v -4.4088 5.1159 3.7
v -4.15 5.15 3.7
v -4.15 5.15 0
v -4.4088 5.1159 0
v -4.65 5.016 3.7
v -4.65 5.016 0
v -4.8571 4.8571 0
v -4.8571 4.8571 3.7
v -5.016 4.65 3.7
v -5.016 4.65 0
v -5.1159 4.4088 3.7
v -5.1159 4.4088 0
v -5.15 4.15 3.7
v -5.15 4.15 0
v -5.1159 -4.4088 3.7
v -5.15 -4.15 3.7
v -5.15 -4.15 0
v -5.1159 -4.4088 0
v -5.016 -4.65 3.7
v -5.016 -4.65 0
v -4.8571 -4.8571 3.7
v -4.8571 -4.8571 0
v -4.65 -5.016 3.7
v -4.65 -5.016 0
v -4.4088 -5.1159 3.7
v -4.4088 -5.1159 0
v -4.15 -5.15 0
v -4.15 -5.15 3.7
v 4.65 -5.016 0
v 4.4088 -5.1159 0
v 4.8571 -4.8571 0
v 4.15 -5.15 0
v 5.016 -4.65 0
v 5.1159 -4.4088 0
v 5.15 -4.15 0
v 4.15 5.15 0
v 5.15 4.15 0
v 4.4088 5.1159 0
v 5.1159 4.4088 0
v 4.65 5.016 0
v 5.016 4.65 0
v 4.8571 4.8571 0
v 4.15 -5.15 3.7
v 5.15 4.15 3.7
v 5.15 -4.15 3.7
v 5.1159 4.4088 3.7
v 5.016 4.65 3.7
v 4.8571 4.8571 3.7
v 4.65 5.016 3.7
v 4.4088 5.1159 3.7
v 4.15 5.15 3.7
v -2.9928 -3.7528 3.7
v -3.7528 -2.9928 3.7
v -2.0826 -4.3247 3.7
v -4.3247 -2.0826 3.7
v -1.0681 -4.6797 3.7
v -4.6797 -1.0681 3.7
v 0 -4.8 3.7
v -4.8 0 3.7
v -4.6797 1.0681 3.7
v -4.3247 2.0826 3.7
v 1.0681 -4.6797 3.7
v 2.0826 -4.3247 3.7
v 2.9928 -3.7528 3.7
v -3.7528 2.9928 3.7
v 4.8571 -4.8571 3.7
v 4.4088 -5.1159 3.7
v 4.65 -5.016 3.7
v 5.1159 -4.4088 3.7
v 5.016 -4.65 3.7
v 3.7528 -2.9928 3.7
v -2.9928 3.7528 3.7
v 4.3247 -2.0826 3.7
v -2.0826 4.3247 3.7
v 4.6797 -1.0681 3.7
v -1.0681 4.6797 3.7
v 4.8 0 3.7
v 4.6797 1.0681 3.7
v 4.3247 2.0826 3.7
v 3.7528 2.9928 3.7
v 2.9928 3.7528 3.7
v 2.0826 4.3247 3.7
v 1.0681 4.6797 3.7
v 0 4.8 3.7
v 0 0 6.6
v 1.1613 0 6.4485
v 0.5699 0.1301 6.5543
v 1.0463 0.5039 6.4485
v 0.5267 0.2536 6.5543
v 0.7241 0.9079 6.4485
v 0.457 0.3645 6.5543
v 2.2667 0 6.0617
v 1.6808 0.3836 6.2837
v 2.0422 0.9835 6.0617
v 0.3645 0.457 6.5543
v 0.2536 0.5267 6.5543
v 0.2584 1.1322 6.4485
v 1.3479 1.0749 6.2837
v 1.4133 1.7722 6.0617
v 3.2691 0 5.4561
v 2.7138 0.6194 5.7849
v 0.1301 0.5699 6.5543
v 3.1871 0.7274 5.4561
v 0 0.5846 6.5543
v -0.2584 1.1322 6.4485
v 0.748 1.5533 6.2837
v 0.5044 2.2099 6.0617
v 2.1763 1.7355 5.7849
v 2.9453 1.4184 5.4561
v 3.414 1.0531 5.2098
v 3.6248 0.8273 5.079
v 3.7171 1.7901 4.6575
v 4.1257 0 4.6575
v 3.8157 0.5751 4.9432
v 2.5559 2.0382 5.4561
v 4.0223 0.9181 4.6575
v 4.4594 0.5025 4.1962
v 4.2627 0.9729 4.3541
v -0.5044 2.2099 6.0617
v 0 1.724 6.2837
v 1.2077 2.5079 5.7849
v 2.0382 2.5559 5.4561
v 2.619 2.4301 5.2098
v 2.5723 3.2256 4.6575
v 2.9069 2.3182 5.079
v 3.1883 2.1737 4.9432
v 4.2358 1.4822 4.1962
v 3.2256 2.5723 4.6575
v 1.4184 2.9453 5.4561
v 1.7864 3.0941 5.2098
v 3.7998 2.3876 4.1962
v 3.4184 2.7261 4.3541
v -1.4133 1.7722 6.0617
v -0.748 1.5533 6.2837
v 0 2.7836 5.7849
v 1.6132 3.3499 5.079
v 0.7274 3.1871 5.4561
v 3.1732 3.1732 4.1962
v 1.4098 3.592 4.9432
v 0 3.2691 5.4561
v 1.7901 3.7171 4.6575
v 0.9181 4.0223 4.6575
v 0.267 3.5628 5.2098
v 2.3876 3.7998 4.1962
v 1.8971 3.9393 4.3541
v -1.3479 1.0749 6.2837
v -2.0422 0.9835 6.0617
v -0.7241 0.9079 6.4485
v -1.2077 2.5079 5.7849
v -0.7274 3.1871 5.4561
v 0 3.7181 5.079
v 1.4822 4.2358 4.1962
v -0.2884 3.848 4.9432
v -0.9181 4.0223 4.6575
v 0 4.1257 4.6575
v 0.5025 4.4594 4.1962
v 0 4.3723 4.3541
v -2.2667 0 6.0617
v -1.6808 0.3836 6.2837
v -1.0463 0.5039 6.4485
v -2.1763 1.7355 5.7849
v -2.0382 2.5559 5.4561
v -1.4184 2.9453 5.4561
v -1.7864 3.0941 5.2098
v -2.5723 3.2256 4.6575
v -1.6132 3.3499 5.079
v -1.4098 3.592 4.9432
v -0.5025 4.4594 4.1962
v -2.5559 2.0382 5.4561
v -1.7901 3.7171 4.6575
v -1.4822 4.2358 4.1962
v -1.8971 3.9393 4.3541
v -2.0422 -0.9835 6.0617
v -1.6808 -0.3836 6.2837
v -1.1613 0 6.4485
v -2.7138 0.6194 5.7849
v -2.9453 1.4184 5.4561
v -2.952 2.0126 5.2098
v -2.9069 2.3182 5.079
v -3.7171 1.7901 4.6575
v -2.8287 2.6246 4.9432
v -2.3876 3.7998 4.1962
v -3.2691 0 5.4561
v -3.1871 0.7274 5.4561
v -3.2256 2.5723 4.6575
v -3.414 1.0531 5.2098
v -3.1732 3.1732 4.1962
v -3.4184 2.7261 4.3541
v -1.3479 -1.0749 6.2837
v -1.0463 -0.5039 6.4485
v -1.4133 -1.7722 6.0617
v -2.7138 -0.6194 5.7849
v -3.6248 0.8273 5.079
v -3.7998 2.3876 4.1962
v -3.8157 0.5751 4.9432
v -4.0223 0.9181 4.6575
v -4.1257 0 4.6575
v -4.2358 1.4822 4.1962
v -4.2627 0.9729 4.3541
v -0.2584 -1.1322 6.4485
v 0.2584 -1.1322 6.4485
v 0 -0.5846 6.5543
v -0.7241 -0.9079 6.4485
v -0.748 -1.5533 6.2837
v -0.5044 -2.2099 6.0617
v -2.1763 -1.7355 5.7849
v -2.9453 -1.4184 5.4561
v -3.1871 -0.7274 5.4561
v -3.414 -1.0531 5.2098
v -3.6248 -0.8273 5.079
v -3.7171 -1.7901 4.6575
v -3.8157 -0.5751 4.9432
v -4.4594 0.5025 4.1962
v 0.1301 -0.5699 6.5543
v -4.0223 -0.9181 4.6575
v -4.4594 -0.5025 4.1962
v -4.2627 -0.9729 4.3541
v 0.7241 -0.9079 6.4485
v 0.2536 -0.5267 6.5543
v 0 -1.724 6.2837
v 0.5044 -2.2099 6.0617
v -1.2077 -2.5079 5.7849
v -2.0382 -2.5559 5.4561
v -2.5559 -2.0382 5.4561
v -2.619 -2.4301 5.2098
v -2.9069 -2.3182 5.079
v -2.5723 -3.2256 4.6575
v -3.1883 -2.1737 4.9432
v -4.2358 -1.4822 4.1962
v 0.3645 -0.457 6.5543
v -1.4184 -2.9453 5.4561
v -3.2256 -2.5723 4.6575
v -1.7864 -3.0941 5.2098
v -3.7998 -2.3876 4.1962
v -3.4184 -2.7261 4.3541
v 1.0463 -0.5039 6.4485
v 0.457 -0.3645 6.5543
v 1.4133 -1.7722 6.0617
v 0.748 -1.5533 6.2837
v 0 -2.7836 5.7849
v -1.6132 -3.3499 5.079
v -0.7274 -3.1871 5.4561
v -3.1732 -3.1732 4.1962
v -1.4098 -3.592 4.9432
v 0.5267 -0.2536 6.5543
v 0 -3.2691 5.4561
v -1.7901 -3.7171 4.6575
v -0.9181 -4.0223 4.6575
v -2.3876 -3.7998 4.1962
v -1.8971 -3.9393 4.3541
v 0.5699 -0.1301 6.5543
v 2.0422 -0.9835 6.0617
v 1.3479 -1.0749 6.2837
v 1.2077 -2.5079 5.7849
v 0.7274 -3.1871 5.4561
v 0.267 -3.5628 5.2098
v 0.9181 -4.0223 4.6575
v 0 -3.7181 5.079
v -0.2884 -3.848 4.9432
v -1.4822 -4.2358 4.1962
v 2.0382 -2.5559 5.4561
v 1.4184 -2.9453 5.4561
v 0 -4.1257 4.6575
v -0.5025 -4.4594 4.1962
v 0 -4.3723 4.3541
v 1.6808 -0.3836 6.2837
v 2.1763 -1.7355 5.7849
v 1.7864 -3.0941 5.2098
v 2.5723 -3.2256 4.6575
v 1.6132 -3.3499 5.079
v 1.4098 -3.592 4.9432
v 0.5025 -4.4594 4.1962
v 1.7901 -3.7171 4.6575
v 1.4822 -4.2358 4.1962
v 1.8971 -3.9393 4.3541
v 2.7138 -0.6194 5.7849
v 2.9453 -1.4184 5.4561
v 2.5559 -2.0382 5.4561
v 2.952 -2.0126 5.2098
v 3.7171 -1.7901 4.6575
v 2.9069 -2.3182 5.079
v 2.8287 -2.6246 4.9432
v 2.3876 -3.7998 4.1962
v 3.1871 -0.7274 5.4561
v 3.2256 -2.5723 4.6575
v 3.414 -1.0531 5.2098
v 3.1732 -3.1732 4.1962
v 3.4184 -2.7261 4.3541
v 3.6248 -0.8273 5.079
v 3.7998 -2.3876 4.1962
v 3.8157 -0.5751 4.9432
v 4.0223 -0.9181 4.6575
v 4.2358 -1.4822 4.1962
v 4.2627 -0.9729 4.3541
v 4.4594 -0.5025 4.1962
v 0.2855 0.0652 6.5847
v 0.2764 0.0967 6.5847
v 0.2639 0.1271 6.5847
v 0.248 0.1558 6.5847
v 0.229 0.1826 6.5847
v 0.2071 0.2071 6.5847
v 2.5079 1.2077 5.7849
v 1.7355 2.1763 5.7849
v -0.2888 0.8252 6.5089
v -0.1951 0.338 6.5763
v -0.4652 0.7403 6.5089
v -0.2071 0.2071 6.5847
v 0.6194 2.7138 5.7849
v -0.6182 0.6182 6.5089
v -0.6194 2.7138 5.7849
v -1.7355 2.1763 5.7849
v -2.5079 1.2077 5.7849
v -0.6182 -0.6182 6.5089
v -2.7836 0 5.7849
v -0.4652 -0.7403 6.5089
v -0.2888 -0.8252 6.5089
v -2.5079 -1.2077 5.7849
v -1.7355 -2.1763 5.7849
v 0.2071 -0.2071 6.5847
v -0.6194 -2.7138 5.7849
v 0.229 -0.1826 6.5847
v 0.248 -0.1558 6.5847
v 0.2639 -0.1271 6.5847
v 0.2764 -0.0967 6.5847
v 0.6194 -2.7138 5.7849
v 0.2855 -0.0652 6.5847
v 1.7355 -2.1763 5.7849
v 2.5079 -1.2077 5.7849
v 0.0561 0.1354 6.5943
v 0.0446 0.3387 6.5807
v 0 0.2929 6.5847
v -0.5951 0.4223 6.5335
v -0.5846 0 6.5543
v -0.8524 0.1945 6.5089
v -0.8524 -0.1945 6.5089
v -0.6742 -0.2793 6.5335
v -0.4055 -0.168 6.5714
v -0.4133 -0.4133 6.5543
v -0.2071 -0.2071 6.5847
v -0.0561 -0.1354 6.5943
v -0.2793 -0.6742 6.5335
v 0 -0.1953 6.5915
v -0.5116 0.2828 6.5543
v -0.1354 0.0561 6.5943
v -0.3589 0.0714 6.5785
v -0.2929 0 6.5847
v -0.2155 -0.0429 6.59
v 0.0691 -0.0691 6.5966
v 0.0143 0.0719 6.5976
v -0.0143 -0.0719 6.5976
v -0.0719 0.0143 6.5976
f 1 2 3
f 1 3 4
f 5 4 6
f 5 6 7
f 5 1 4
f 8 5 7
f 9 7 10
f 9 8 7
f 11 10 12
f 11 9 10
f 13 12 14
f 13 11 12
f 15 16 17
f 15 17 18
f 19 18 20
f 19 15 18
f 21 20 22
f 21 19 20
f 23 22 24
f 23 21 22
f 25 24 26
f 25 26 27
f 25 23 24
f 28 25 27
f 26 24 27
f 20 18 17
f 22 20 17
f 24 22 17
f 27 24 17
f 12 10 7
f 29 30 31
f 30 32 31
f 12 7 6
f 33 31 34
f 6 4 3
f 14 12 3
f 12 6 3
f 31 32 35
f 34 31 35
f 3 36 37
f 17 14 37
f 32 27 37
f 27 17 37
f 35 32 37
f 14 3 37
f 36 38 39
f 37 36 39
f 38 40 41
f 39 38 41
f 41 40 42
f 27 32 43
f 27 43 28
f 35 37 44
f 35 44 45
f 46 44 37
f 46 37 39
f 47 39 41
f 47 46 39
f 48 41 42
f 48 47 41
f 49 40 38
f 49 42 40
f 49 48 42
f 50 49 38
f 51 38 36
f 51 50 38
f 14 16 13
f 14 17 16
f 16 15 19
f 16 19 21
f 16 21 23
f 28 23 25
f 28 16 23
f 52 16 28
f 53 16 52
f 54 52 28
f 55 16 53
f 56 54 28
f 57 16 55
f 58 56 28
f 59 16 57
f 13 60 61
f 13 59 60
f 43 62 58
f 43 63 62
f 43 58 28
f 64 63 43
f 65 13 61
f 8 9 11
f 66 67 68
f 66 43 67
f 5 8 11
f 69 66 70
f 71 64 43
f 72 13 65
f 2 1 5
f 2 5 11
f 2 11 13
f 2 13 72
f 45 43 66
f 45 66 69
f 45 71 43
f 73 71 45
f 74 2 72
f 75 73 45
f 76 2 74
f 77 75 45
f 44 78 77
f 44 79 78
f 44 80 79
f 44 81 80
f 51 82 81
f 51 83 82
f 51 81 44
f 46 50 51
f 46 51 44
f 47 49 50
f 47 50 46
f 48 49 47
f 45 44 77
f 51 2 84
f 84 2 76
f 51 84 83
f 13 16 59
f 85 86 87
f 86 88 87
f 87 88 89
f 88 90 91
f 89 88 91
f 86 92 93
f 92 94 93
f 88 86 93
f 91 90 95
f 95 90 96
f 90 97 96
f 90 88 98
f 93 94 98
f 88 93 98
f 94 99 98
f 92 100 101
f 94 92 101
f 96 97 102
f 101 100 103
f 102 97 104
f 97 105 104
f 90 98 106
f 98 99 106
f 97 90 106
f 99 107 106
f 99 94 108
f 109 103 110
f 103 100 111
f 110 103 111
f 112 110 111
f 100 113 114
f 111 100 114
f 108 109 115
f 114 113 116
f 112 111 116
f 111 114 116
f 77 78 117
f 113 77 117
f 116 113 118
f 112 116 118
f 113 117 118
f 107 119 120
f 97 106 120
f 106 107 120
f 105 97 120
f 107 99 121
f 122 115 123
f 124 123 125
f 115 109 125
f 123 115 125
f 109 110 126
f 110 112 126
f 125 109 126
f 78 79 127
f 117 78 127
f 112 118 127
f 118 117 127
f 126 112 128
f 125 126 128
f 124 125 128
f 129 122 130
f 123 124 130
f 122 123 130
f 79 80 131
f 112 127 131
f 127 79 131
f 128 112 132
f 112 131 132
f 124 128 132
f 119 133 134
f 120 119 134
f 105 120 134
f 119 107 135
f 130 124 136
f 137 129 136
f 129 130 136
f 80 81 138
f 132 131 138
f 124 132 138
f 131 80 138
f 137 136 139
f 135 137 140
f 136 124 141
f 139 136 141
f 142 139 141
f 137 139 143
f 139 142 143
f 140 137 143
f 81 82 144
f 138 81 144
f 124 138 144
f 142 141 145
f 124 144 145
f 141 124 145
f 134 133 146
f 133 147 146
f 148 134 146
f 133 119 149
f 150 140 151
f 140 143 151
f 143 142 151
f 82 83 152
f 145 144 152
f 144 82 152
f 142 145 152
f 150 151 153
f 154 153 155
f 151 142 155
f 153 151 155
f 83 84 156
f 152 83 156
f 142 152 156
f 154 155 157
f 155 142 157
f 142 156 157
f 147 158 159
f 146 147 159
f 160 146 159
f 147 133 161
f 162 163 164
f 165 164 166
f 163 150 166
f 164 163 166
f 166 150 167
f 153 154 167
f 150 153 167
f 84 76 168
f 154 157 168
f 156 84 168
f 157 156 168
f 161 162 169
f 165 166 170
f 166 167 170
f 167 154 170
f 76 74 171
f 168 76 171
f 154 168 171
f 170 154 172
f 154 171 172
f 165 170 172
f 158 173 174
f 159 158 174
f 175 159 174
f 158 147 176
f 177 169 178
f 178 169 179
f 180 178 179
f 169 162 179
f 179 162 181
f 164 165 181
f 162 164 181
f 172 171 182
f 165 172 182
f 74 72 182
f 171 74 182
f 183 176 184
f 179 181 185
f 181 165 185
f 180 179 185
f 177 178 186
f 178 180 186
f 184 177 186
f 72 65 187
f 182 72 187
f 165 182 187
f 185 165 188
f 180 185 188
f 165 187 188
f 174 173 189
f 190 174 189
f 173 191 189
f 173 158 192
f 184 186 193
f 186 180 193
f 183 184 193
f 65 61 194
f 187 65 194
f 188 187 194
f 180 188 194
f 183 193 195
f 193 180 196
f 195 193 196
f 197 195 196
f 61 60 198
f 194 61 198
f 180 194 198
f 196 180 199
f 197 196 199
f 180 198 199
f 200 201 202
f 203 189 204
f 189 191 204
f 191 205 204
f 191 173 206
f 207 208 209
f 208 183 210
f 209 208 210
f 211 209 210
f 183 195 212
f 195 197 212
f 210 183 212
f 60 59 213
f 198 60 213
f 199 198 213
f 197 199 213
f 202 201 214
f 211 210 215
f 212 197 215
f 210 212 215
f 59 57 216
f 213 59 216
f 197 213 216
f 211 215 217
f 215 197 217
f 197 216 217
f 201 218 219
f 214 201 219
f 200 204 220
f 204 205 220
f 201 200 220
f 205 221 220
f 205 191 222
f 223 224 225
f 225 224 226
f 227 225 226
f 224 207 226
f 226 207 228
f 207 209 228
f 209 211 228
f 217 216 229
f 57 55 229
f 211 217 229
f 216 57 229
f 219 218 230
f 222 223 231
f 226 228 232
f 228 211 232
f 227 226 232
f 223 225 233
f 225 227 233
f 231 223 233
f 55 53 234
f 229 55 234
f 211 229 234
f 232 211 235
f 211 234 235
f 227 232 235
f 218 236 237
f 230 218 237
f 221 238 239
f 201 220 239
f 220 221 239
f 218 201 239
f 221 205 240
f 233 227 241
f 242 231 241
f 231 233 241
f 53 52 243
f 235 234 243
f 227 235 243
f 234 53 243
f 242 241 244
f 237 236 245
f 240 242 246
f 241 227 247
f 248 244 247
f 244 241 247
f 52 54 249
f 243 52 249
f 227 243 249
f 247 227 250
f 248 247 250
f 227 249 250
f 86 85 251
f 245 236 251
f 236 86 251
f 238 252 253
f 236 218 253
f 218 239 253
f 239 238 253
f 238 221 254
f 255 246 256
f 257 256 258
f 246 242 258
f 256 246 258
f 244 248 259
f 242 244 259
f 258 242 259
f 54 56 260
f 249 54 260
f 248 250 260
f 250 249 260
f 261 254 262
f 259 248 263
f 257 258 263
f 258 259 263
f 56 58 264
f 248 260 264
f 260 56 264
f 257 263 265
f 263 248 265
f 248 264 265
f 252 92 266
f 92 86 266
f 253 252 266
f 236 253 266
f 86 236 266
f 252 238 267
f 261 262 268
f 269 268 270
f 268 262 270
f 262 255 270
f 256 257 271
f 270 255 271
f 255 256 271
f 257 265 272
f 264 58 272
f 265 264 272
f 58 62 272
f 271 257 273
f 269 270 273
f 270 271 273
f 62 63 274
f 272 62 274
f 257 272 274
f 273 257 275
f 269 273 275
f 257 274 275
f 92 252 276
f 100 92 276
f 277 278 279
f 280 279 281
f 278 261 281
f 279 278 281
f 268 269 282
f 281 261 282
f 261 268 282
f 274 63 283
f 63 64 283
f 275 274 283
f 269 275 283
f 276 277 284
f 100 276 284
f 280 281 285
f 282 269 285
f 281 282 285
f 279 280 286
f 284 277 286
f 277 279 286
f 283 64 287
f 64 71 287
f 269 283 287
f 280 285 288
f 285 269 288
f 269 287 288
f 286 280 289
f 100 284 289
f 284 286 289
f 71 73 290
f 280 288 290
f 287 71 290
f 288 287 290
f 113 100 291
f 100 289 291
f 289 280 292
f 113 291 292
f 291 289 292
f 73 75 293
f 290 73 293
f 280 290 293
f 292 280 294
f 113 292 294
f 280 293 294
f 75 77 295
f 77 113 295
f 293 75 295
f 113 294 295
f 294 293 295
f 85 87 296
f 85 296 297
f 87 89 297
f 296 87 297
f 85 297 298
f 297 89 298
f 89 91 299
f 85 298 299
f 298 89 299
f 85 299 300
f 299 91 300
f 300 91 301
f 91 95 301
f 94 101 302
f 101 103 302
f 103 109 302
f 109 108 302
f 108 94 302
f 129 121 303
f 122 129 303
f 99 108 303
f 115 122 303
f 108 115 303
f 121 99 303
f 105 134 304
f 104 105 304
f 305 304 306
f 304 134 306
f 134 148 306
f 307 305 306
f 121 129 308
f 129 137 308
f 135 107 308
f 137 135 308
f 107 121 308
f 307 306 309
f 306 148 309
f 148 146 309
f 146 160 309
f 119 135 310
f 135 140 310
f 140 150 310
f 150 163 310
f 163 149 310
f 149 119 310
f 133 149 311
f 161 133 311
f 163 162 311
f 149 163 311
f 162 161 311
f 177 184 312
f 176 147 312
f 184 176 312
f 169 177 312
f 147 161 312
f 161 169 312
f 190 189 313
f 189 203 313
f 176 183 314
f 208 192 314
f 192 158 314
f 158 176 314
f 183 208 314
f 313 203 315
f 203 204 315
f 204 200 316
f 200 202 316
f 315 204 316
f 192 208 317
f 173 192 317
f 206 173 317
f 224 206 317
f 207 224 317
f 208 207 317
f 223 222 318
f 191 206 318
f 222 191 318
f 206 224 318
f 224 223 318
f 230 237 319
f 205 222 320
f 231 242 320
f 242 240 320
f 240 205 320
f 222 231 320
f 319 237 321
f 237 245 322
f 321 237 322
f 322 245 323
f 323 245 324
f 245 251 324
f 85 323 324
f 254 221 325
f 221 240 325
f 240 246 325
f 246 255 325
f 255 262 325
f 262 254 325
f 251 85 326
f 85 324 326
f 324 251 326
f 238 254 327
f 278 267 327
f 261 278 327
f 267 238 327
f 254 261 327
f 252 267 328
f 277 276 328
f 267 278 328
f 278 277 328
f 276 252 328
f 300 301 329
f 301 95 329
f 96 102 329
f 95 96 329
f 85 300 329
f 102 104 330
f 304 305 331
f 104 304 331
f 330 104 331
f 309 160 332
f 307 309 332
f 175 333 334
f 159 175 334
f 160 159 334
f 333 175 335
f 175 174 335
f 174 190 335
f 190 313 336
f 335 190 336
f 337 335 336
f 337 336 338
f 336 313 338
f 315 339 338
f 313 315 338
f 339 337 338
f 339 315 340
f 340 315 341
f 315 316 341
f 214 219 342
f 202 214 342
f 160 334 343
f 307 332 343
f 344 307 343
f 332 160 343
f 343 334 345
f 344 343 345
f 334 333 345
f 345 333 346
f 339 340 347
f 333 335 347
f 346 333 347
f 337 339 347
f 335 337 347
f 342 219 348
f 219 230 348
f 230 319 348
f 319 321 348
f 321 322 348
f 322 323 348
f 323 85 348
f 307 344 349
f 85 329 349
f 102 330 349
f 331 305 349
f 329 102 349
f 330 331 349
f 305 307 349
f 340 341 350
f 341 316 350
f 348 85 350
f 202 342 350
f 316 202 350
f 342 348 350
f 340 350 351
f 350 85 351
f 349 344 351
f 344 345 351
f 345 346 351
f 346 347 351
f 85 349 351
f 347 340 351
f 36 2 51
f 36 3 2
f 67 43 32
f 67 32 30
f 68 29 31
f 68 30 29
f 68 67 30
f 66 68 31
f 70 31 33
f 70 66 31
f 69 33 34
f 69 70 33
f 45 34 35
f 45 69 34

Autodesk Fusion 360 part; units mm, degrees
sketch "Sketch1" plane through (0, 0, 0) normal (0, 0, 1) x (1, 0, 0)
  line L0 (-5.15, 5.15) -> (5.15, 5.15)
  line L1 (5.15, 5.15) -> (5.15, -5.15)
  line L2 (5.15, -5.15) -> (-5.15, -5.15)
  line L3 (-5.15, -5.15) -> (-5.15, 5.15)
  dimension "d1" = 10.3
  dimension "d2" = 10.3
  dimension "d3" = 5.15
  dimension "d4" = 5.15
extrude "Extrude1" add sketch "Sketch1" along normal blind 3.7
sketch "Sketch2" plane through (0, 0, 0) normal (0, 1, 0) x (1, 0, 0)
  line L0 (-5.15, -3.7) -> (5.15, -3.7)
  line L1 (0, -3.7) -> (0, -6.6)
  line L2 (5.15, 0) -> (-5.15, 0)
  line L3 (0, -3.7) -> (4.8, -3.7)
  arc A0 (0, -6.6) -> (4.8, -3.7) centre (-0.149, -0.931) ccw
  dimension "d7" = 6.6
  dimension "d8" = 4.8
revolve "Revolve1" add sketch "Sketch2" angle 360 about axis through (0, 0, 3.7) along (0, 0, 1)
fillet "Fillet1" radius 1 4 edges at (5.15, -5.15, 1.85) (5.15, 5.15, 1.85) (-5.15, 5.15, 1.85) (-5.15, -5.15, 1.85)
equation "d3 = d1 / 2"
equation "d4 = d2 / 2"
equation "d8 = ( 9.6 / 2 ) * 1 mm"
